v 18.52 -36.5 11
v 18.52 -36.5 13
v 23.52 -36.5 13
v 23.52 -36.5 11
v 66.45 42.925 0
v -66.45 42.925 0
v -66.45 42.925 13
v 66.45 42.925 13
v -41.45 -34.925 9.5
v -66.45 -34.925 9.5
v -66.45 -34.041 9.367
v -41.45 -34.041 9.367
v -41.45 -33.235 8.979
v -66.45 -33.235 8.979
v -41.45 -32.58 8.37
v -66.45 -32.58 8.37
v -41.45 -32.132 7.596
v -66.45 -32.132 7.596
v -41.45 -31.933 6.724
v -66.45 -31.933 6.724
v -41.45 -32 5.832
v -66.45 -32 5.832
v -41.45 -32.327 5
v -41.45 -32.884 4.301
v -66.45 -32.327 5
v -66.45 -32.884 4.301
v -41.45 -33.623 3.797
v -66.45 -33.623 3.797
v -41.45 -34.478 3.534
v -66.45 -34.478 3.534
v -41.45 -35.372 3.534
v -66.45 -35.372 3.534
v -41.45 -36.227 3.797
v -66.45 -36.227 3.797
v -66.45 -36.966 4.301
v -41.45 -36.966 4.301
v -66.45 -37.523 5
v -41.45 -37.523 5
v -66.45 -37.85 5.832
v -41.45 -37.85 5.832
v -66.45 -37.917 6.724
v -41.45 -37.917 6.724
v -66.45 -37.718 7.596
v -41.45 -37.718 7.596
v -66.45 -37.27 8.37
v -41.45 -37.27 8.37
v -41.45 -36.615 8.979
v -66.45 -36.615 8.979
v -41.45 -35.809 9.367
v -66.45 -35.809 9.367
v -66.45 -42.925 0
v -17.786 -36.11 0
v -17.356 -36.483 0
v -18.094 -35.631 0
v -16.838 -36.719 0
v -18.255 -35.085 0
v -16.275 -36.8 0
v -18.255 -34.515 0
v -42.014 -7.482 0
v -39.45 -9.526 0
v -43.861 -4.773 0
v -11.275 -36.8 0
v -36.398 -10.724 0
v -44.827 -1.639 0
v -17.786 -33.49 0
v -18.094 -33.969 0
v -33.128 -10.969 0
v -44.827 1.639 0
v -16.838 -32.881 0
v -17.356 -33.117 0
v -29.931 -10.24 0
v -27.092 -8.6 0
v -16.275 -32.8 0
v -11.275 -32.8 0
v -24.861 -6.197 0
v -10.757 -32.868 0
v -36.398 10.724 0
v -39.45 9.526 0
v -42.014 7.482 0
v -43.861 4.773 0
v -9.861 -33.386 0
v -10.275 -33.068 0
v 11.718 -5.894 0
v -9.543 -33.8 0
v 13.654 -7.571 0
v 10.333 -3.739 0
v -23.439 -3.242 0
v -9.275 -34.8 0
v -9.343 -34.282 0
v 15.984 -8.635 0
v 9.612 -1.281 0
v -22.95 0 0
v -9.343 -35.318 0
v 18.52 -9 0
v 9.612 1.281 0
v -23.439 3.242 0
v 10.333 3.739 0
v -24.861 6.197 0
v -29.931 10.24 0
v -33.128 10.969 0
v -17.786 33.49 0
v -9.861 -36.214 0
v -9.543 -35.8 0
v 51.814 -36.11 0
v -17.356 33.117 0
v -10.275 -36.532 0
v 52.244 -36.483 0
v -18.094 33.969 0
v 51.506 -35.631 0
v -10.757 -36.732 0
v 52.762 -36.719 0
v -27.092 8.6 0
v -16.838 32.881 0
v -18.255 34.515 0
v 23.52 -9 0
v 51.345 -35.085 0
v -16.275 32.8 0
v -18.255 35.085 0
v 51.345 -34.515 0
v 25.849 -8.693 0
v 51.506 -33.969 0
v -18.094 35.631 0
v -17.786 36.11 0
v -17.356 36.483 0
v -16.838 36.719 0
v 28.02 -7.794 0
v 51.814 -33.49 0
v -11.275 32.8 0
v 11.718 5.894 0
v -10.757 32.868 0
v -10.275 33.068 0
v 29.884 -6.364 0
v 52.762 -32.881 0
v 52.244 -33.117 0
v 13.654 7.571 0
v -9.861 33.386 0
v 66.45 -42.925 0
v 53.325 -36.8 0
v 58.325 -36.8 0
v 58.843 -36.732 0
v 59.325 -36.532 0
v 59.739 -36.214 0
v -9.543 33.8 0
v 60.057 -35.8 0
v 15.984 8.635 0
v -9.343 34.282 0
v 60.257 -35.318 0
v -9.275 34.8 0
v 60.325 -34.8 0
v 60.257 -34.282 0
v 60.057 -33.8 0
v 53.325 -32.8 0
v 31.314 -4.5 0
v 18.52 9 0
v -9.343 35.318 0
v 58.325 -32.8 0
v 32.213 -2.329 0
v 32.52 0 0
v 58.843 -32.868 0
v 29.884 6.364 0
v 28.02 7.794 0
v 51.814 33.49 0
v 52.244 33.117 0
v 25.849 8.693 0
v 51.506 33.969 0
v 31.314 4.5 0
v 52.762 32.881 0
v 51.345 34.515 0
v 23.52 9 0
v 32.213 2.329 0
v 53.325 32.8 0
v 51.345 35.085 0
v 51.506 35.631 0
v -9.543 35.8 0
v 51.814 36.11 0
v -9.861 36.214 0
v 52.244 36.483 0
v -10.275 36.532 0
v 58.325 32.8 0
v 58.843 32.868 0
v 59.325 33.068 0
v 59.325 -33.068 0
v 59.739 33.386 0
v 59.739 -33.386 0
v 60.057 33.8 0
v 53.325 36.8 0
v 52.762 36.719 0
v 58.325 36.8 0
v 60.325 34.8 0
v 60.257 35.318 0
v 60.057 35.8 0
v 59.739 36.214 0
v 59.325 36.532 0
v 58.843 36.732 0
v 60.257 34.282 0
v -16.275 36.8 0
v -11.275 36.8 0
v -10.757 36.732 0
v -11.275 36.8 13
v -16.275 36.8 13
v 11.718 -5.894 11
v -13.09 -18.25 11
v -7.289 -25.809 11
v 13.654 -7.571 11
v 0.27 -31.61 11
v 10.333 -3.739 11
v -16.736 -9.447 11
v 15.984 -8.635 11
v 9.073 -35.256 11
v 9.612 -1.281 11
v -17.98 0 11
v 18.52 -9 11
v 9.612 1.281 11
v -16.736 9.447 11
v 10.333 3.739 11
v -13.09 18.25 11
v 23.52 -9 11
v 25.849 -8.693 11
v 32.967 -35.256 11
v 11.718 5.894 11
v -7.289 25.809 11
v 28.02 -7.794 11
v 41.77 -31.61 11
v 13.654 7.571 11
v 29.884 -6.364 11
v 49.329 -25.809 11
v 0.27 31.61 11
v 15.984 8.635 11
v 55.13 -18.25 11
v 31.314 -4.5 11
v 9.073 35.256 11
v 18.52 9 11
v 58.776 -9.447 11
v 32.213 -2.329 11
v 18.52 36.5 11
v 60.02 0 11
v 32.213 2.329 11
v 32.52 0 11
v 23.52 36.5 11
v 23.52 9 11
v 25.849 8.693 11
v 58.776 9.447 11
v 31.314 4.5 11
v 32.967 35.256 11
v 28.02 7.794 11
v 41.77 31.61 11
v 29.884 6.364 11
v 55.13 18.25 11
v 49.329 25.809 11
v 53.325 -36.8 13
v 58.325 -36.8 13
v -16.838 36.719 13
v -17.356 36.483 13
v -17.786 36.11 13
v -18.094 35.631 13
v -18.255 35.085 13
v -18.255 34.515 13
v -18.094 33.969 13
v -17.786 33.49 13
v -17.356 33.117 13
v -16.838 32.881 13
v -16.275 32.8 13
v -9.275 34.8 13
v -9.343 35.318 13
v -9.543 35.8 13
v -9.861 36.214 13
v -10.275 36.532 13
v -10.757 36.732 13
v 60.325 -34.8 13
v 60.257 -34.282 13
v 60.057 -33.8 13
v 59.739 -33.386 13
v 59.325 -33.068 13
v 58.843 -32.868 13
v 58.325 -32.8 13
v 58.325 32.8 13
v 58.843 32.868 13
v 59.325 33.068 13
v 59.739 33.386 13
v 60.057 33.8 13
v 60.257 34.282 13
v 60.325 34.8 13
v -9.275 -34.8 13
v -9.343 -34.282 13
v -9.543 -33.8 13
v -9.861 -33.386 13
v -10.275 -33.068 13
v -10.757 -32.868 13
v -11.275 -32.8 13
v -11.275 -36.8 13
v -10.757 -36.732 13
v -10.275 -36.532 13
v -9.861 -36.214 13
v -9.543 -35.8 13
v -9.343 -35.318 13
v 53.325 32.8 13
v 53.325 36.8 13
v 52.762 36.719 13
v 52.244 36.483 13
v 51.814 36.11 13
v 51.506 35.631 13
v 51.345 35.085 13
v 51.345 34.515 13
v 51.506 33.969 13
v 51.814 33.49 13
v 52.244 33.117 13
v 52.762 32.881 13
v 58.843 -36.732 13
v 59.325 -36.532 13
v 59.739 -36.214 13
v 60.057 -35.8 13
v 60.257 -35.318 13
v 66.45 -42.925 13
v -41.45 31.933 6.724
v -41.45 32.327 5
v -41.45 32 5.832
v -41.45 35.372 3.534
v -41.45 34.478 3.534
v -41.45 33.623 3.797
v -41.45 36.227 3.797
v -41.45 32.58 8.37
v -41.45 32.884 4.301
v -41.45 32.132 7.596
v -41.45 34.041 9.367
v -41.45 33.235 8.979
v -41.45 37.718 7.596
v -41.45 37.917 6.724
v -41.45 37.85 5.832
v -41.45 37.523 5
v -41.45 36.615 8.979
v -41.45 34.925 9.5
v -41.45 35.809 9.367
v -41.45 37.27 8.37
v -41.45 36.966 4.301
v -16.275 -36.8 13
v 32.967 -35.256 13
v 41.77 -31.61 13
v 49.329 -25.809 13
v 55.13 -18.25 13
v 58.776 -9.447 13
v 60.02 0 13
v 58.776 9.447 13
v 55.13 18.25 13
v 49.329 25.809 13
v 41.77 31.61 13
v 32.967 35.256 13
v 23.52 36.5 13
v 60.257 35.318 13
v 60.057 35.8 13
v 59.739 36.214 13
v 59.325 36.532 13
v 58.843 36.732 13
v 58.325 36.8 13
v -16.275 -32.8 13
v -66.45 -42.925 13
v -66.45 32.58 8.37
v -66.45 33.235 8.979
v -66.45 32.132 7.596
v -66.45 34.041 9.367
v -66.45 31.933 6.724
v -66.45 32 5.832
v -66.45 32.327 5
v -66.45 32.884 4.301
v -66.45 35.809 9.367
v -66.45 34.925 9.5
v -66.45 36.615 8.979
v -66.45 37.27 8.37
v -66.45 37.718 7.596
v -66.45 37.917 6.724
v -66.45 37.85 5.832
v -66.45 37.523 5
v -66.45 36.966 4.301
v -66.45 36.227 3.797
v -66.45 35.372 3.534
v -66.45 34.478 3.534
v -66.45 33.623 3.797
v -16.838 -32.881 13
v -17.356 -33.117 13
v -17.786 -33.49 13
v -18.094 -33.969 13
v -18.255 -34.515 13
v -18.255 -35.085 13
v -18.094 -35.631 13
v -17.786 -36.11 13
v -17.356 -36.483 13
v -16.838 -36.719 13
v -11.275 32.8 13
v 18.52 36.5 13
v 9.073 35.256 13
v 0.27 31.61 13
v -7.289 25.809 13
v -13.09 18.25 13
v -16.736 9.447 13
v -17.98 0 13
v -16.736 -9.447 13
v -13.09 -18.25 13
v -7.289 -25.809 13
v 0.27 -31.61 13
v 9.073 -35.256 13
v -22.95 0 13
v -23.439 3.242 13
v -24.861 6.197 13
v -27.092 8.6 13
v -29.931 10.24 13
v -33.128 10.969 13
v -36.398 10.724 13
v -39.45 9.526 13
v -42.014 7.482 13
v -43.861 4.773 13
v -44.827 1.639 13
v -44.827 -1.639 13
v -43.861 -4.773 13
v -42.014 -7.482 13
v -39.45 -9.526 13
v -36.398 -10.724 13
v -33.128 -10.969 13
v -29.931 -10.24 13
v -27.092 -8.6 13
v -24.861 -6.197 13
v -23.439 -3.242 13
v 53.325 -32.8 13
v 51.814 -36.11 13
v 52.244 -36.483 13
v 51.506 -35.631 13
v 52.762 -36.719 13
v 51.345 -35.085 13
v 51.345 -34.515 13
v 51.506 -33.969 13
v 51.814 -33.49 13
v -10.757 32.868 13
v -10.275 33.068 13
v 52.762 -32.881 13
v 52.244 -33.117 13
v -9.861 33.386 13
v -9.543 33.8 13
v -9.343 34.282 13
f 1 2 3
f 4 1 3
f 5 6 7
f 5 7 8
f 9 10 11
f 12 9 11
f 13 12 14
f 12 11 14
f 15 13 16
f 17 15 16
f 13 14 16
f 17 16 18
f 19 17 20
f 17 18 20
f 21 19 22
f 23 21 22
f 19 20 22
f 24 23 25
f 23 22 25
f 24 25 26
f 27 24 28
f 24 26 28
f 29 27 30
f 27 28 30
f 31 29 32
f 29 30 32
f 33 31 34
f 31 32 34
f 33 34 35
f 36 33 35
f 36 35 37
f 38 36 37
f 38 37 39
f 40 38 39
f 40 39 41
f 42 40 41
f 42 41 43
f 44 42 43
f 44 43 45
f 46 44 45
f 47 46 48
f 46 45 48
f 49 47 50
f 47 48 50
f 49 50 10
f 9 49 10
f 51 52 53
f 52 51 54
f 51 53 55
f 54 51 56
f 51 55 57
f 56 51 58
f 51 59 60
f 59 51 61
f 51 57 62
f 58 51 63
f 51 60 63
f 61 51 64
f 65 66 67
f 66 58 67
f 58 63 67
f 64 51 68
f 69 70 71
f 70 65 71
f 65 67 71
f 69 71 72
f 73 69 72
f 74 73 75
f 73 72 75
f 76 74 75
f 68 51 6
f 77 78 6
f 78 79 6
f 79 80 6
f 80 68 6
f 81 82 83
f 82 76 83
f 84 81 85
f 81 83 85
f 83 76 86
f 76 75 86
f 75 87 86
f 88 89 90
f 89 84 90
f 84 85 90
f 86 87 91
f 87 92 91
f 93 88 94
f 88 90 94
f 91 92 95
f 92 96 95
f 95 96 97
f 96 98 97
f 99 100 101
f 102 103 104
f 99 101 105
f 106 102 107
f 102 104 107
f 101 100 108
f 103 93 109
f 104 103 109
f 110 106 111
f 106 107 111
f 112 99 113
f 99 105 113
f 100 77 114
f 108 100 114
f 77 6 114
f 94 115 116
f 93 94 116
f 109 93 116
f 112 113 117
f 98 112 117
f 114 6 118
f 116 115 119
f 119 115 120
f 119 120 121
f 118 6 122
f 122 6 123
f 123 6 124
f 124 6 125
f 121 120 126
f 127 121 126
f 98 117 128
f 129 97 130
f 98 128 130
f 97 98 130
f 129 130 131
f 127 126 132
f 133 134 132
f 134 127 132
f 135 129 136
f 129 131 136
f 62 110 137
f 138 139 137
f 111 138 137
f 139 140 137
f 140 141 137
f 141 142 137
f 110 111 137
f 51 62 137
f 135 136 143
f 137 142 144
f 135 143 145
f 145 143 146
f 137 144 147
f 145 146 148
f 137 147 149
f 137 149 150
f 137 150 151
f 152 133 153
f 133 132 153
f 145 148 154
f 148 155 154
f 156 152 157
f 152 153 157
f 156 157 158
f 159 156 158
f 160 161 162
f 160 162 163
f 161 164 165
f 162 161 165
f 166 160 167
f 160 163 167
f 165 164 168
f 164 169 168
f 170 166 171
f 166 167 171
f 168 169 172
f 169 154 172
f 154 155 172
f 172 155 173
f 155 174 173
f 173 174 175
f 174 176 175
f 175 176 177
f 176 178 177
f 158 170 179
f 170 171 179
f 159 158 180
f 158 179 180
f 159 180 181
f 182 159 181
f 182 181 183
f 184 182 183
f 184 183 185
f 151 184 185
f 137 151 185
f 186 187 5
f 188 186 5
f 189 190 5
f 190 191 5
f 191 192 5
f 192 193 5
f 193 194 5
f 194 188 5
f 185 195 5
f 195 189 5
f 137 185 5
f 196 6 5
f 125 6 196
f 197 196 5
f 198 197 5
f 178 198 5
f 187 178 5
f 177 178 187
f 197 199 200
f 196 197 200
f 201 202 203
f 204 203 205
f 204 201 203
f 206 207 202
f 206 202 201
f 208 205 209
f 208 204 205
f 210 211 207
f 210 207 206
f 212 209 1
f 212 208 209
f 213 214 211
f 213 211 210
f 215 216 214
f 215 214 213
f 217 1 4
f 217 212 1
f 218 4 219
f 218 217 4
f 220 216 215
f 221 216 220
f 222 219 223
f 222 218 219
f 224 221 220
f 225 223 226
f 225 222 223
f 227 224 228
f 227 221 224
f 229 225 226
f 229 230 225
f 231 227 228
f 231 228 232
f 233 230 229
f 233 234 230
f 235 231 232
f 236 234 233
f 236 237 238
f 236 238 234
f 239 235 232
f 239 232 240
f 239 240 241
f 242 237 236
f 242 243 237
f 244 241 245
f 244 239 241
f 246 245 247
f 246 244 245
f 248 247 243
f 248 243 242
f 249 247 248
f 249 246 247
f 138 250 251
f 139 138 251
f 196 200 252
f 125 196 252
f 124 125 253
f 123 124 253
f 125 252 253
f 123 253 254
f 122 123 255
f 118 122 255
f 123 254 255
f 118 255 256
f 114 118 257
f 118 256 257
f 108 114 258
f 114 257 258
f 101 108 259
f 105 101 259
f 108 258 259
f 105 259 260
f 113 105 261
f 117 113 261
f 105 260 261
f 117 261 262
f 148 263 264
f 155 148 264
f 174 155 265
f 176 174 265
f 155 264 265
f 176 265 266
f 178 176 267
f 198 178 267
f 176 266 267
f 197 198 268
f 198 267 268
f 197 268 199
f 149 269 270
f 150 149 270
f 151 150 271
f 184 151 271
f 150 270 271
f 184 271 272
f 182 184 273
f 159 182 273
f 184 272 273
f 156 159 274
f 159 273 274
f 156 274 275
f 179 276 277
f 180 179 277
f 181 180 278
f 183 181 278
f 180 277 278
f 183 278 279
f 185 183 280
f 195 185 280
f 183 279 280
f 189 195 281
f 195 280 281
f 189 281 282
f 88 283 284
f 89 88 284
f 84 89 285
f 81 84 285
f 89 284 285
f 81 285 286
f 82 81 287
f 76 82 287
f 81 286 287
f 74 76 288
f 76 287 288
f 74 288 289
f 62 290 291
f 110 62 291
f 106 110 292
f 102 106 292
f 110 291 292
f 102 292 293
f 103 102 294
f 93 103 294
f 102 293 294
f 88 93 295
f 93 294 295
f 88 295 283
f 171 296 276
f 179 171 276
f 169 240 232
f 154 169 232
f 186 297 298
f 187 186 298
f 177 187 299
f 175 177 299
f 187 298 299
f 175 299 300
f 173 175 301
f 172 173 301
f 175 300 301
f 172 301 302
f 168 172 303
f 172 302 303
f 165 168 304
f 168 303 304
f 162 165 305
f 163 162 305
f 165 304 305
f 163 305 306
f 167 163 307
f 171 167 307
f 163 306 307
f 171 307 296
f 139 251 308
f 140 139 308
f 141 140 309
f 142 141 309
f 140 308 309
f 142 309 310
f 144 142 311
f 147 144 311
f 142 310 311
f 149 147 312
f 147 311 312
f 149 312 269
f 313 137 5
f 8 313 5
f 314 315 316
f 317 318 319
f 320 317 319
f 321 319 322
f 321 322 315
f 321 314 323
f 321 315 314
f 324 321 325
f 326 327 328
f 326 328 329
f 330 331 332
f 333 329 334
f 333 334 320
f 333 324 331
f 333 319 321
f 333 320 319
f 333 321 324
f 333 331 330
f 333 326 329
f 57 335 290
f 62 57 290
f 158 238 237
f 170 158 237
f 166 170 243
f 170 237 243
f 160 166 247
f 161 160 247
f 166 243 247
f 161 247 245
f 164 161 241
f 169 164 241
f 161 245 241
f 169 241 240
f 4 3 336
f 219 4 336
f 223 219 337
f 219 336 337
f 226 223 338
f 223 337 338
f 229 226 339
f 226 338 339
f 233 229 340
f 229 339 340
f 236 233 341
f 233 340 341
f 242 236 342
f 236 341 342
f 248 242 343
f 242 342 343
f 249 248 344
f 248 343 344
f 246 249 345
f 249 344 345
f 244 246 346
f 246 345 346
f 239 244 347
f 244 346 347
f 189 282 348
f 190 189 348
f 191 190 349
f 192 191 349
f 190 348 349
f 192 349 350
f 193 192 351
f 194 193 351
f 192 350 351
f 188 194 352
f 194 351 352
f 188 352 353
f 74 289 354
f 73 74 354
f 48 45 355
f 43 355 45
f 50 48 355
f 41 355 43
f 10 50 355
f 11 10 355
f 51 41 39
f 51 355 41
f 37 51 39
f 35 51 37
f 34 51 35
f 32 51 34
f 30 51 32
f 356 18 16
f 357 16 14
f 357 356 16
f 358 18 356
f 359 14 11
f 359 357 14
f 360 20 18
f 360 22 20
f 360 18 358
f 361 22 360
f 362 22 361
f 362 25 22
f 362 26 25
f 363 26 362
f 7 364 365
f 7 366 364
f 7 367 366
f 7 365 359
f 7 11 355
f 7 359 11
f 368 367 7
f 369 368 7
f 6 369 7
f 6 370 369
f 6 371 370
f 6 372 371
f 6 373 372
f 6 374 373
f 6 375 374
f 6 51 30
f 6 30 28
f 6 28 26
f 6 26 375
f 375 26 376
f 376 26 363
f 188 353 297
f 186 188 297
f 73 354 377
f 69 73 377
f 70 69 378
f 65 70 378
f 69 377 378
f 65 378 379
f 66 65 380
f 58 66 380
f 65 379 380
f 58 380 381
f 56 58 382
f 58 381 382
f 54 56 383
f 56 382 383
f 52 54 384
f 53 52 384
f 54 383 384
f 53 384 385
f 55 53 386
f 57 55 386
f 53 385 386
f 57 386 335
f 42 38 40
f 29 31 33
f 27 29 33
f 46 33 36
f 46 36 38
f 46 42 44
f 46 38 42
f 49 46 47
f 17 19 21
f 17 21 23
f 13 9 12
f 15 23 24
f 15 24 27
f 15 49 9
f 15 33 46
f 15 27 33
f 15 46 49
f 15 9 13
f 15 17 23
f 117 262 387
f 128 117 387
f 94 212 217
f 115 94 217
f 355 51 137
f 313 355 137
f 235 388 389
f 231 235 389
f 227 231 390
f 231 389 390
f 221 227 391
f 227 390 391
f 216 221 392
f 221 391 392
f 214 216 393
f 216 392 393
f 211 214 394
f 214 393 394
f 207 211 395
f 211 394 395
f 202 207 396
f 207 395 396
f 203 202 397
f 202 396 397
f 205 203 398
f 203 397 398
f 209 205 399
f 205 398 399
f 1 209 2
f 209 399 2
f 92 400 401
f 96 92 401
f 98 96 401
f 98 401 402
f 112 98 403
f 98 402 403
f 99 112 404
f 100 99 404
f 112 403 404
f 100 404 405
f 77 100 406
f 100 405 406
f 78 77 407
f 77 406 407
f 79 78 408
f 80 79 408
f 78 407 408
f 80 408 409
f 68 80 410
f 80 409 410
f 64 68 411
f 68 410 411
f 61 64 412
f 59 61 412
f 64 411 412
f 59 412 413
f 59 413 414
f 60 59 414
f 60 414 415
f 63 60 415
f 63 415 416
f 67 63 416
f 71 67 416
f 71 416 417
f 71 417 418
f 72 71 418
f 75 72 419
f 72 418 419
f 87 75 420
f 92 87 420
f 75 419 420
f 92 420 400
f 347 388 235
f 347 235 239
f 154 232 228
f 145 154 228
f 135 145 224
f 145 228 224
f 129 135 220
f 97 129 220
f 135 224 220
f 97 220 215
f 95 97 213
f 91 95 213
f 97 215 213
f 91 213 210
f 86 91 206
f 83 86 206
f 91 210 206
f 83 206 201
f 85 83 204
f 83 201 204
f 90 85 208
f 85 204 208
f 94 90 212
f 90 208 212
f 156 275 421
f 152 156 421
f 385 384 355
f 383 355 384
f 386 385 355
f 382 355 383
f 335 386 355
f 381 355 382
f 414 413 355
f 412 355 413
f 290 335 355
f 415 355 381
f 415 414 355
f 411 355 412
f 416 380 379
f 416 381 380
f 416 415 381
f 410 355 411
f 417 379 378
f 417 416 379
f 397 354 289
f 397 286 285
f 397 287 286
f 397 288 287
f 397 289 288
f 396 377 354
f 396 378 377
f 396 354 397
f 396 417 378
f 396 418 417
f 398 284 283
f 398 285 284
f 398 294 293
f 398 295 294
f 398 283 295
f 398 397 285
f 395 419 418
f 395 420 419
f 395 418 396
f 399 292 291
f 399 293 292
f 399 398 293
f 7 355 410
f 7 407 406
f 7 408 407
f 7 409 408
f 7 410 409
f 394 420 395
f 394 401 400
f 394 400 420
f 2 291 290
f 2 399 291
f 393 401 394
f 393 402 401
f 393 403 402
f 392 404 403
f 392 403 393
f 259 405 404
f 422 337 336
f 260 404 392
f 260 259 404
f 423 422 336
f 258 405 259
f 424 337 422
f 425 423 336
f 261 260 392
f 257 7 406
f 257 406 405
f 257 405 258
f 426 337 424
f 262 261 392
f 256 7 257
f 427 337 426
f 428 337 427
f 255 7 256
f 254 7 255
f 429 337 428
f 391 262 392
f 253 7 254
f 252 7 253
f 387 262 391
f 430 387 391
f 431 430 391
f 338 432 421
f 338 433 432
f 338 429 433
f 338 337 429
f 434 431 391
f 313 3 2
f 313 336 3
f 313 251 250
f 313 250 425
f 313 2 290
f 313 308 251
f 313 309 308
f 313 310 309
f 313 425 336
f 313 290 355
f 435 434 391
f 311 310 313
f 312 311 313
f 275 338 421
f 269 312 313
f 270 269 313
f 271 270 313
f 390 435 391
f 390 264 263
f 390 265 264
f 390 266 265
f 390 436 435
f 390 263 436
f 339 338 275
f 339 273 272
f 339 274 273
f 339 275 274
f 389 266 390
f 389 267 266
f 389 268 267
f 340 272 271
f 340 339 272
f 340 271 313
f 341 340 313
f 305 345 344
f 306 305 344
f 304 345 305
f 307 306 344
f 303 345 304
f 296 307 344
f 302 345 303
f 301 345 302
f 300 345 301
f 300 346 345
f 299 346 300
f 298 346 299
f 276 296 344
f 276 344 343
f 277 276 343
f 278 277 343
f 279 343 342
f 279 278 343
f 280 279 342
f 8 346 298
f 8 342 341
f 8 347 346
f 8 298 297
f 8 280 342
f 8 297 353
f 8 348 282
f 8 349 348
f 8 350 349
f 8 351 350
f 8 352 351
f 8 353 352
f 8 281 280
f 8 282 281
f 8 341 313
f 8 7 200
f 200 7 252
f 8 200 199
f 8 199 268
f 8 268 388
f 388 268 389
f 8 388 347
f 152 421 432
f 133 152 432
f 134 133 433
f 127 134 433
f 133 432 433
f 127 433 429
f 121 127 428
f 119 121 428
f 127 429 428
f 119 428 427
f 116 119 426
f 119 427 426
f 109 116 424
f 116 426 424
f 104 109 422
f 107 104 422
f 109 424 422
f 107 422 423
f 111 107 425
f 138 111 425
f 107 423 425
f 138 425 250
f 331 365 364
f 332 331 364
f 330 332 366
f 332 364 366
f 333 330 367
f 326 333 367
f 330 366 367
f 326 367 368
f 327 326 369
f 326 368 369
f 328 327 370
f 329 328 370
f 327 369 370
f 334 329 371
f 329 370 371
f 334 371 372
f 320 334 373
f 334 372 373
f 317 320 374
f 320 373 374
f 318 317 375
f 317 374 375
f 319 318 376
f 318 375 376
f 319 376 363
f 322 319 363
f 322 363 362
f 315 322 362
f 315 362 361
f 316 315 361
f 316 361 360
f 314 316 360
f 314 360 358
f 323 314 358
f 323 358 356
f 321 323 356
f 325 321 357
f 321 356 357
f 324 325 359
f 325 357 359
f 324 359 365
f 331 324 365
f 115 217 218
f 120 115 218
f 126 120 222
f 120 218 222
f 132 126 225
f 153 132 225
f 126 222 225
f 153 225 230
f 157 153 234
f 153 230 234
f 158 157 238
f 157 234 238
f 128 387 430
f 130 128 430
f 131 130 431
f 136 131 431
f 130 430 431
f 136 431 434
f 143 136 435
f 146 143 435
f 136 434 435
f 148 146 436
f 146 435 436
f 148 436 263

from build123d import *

# Parameters (mm, degrees)
SZKIC1_W                    = 132.9
SZKIC1_H                    = 85.85
DODANIE_WYCI_GNI_CIE1_DEPTH = 13
SZKIC2_R                    = 36.5
SZKIC2_W                    = 5
SZKIC2_H                    = 73
WYTNIJ_WYCI_GNI_CIE1_DEPTH  = 2
WYTNIJ_WYCI_GNI_CIE3_DEPTH  = 13
SZYK_LINIOWY1_COUNT         = 2
SZYK_LINIOWY1_PITCH         = 69.6
SZYK_LINIOWY1_COUNT_DIR2    = 2
SZYK_LINIOWY1_PITCH_DIR2    = 69.6
WYTNIJ_WYCI_GNI_CIE4_DEPTH  = 13
SZKIC7_R                    = 11
WYTNIJ_WYCI_GNI_CIE5_DEPTH  = 13
SZKIC8_R                    = 3
WYTNIJ_WYCI_GNI_CIE6_DEPTH  = 25


with BuildPart() as part:
    # Szkic1 → Dodanie-wyciągnięcie1 (new body)
    with BuildSketch(Plane.XY):
        Rectangle(SZKIC1_W, SZKIC1_H)
    extrude(amount=DODANIE_WYCI_GNI_CIE1_DEPTH)

    # Szkic2 → Wytnij-wyciągnięcie1 (cut)
    with BuildSketch(Plane.XY.offset(13)):
        with Locations((23.52, 0)):
            Circle(SZKIC2_R)
        with Locations((18.52, 0)):
            Circle(SZKIC2_R)
        with Locations((21.02, 0)):
            Rectangle(SZKIC2_W, SZKIC2_H)
    extrude(amount=-WYTNIJ_WYCI_GNI_CIE1_DEPTH, mode=Mode.SUBTRACT)

    # Szkic3 → Wytnij-wyciągnięcie3 (cut)
    with BuildSketch(Plane.XY.offset(13)):
        with BuildLine():
            ThreePointArc((55.325, 34.8), (54.739213562, 36.214213562), (53.325, 36.8))
            Line((53.325, 36.8), (53.325, 32.8))
            ThreePointArc((53.325, 32.8), (54.739213562, 33.385786438), (55.325, 34.8))
        make_face()
        with BuildLine():
            Line((53.325, 32.8), (53.325, 36.8))
            ThreePointArc((53.325, 36.8), (51.325, 34.8), (53.325, 32.8))
        make_face()
        with BuildLine():
            Line((58.325, 36.8), (53.325, 36.8))
            ThreePointArc((53.325, 36.8), (54.739213562, 36.214213562), (55.325, 34.8))
            ThreePointArc((55.325, 34.8), (54.739213562, 33.385786438), (53.325, 32.8))
            Line((53.325, 32.8), (58.325, 32.8))
            ThreePointArc((58.325, 32.8), (56.325, 34.8), (58.325, 36.8))
        make_face()
        with BuildLine():
            ThreePointArc((60.325, 34.8), (59.739213562, 36.214213562), (58.325, 36.8))
            Line((58.325, 36.8), (58.325, 32.8))
            ThreePointArc((58.325, 32.8), (59.739213562, 33.385786438), (60.325, 34.8))
        make_face()
        with BuildLine():
            Line((58.325, 32.8), (58.325, 36.8))
            ThreePointArc((58.325, 36.8), (56.325, 34.8), (58.325, 32.8))
        make_face()
    wytnij_wyci_gni_cie3 = extrude(amount=-WYTNIJ_WYCI_GNI_CIE3_DEPTH, mode=Mode.SUBTRACT)

    # Szyk liniowy1: Wytnij-wyci_gni_cie3 2 × 2
    with Locations(*[(-j * SZYK_LINIOWY1_PITCH_DIR2, -i * SZYK_LINIOWY1_PITCH, 0) for i in range(SZYK_LINIOWY1_COUNT) for j in range(SZYK_LINIOWY1_COUNT_DIR2) if (i, j) != (0, 0)]):
        add(wytnij_wyci_gni_cie3, mode=Mode.SUBTRACT)

    # Szkic6 → Wytnij-wyciągnięcie4 (cut)
    with BuildSketch(Plane.XY.offset(13)):
        with BuildLine():
            ThreePointArc((21.02, 8.645808233), (19.782482852, 8.911012123), (18.52, 9))
            Line((18.52, 9), (18.52, 7.483314774))
            ThreePointArc((18.52, 7.483314774), (19.725220987, 8.160860999), (21.02, 8.645808233))
        make_face()
        with BuildLine():
            Line((18.52, 7.483314774), (18.52, 9))
            ThreePointArc((18.52, 9), (9.52, 0), (18.52, -9))
            Line((18.52, -9), (18.52, -7.483314774))
            ThreePointArc((18.52, -7.483314774), (14.52, 0), (18.52, 7.483314774))
        make_face()
        with BuildLine():
            Line((18.52, -7.483314774), (18.52, -9))
            ThreePointArc((18.52, -9), (19.782482852, -8.911012123), (21.02, -8.645808233))
            ThreePointArc((21.02, -8.645808233), (19.725220987, -8.160860999), (18.52, -7.483314774))
        make_face()
        with BuildLine():
            Line((18.52, -7.483314774), (18.52, 7.483314774))
            ThreePointArc((18.52, 7.483314774), (14.52, 0), (18.52, -7.483314774))
        make_face()
        with BuildLine():
            ThreePointArc((21.02, 8.645808233), (19.725220987, 8.160860999), (18.52, 7.483314774))
            Line((18.52, 7.483314774), (18.52, -7.483314774))
            ThreePointArc((18.52, -7.483314774), (19.725220987, -8.160860999), (21.02, -8.645808233))
            ThreePointArc((21.02, -8.645808233), (22.314779013, -8.160860999), (23.52, -7.483314774))
            Line((23.52, -7.483314774), (23.52, 7.483314774))
            ThreePointArc((23.52, 7.483314774), (22.314779013, 8.160860999), (21.02, 8.645808233))
        make_face()
        with BuildLine():
            ThreePointArc((27.52, 0), (26.457253933, 4.242640687), (23.52, 7.483314774))
            Line((23.52, 7.483314774), (23.52, -7.483314774))
            ThreePointArc((23.52, -7.483314774), (26.457253933, -4.242640687), (27.52, 0))
        make_face()
        with BuildLine():
            ThreePointArc((32.52, 0), (29.883961031, 6.363961031), (23.52, 9))
            Line((23.52, 9), (23.52, 7.483314774))
            ThreePointArc((23.52, 7.483314774), (26.457253933, 4.242640687), (27.52, 0))
            ThreePointArc((27.52, 0), (26.457253933, -4.242640687), (23.52, -7.483314774))
            Line((23.52, -7.483314774), (23.52, -9))
            ThreePointArc((23.52, -9), (29.883961031, -6.363961031), (32.52, 0))
        make_face()
        with BuildLine():
            Line((23.52, 7.483314774), (23.52, 9))
            ThreePointArc((23.52, 9), (22.257517148, 8.911012123), (21.02, 8.645808233))
            ThreePointArc((21.02, 8.645808233), (22.314779013, 8.160860999), (23.52, 7.483314774))
        make_face()
        with BuildLine():
            ThreePointArc((21.02, -8.645808233), (22.257517148, -8.911012123), (23.52, -9))
            Line((23.52, -9), (23.52, -7.483314774))
            ThreePointArc((23.52, -7.483314774), (22.314779013, -8.160860999), (21.02, -8.645808233))
        make_face()
        with BuildLine():
            ThreePointArc((21.02, -8.645808233), (19.782482852, -8.911012123), (18.52, -9))
            Line((18.52, -9), (23.52, -9))
            ThreePointArc((23.52, -9), (22.257517148, -8.911012123), (21.02, -8.645808233))
        make_face()
        with BuildLine():
            Line((23.52, 9), (18.52, 9))
            ThreePointArc((18.52, 9), (19.782482852, 8.911012123), (21.02, 8.645808233))
            ThreePointArc((21.02, 8.645808233), (22.257517148, 8.911012123), (23.52, 9))
        make_face()
    extrude(amount=-WYTNIJ_WYCI_GNI_CIE4_DEPTH, mode=Mode.SUBTRACT)

    # Szkic7 → Wytnij-wyciągnięcie5 (cut)
    with BuildSketch(Plane.XY.offset(13)):
        with Locations((-33.95, 0)):
            Circle(SZKIC7_R)
    extrude(amount=-WYTNIJ_WYCI_GNI_CIE5_DEPTH, mode=Mode.SUBTRACT)

    # Szkic8 → Wytnij-wyciągnięcie6 (cut)
    with BuildSketch(Plane.ZY.offset(66.45)):
        with Locations((6.5, 34.925)):
            Circle(SZKIC8_R)
        with Locations((6.5, -34.925)):
            Circle(SZKIC8_R)
    extrude(amount=-WYTNIJ_WYCI_GNI_CIE6_DEPTH, mode=Mode.SUBTRACT)


solid = part.part
